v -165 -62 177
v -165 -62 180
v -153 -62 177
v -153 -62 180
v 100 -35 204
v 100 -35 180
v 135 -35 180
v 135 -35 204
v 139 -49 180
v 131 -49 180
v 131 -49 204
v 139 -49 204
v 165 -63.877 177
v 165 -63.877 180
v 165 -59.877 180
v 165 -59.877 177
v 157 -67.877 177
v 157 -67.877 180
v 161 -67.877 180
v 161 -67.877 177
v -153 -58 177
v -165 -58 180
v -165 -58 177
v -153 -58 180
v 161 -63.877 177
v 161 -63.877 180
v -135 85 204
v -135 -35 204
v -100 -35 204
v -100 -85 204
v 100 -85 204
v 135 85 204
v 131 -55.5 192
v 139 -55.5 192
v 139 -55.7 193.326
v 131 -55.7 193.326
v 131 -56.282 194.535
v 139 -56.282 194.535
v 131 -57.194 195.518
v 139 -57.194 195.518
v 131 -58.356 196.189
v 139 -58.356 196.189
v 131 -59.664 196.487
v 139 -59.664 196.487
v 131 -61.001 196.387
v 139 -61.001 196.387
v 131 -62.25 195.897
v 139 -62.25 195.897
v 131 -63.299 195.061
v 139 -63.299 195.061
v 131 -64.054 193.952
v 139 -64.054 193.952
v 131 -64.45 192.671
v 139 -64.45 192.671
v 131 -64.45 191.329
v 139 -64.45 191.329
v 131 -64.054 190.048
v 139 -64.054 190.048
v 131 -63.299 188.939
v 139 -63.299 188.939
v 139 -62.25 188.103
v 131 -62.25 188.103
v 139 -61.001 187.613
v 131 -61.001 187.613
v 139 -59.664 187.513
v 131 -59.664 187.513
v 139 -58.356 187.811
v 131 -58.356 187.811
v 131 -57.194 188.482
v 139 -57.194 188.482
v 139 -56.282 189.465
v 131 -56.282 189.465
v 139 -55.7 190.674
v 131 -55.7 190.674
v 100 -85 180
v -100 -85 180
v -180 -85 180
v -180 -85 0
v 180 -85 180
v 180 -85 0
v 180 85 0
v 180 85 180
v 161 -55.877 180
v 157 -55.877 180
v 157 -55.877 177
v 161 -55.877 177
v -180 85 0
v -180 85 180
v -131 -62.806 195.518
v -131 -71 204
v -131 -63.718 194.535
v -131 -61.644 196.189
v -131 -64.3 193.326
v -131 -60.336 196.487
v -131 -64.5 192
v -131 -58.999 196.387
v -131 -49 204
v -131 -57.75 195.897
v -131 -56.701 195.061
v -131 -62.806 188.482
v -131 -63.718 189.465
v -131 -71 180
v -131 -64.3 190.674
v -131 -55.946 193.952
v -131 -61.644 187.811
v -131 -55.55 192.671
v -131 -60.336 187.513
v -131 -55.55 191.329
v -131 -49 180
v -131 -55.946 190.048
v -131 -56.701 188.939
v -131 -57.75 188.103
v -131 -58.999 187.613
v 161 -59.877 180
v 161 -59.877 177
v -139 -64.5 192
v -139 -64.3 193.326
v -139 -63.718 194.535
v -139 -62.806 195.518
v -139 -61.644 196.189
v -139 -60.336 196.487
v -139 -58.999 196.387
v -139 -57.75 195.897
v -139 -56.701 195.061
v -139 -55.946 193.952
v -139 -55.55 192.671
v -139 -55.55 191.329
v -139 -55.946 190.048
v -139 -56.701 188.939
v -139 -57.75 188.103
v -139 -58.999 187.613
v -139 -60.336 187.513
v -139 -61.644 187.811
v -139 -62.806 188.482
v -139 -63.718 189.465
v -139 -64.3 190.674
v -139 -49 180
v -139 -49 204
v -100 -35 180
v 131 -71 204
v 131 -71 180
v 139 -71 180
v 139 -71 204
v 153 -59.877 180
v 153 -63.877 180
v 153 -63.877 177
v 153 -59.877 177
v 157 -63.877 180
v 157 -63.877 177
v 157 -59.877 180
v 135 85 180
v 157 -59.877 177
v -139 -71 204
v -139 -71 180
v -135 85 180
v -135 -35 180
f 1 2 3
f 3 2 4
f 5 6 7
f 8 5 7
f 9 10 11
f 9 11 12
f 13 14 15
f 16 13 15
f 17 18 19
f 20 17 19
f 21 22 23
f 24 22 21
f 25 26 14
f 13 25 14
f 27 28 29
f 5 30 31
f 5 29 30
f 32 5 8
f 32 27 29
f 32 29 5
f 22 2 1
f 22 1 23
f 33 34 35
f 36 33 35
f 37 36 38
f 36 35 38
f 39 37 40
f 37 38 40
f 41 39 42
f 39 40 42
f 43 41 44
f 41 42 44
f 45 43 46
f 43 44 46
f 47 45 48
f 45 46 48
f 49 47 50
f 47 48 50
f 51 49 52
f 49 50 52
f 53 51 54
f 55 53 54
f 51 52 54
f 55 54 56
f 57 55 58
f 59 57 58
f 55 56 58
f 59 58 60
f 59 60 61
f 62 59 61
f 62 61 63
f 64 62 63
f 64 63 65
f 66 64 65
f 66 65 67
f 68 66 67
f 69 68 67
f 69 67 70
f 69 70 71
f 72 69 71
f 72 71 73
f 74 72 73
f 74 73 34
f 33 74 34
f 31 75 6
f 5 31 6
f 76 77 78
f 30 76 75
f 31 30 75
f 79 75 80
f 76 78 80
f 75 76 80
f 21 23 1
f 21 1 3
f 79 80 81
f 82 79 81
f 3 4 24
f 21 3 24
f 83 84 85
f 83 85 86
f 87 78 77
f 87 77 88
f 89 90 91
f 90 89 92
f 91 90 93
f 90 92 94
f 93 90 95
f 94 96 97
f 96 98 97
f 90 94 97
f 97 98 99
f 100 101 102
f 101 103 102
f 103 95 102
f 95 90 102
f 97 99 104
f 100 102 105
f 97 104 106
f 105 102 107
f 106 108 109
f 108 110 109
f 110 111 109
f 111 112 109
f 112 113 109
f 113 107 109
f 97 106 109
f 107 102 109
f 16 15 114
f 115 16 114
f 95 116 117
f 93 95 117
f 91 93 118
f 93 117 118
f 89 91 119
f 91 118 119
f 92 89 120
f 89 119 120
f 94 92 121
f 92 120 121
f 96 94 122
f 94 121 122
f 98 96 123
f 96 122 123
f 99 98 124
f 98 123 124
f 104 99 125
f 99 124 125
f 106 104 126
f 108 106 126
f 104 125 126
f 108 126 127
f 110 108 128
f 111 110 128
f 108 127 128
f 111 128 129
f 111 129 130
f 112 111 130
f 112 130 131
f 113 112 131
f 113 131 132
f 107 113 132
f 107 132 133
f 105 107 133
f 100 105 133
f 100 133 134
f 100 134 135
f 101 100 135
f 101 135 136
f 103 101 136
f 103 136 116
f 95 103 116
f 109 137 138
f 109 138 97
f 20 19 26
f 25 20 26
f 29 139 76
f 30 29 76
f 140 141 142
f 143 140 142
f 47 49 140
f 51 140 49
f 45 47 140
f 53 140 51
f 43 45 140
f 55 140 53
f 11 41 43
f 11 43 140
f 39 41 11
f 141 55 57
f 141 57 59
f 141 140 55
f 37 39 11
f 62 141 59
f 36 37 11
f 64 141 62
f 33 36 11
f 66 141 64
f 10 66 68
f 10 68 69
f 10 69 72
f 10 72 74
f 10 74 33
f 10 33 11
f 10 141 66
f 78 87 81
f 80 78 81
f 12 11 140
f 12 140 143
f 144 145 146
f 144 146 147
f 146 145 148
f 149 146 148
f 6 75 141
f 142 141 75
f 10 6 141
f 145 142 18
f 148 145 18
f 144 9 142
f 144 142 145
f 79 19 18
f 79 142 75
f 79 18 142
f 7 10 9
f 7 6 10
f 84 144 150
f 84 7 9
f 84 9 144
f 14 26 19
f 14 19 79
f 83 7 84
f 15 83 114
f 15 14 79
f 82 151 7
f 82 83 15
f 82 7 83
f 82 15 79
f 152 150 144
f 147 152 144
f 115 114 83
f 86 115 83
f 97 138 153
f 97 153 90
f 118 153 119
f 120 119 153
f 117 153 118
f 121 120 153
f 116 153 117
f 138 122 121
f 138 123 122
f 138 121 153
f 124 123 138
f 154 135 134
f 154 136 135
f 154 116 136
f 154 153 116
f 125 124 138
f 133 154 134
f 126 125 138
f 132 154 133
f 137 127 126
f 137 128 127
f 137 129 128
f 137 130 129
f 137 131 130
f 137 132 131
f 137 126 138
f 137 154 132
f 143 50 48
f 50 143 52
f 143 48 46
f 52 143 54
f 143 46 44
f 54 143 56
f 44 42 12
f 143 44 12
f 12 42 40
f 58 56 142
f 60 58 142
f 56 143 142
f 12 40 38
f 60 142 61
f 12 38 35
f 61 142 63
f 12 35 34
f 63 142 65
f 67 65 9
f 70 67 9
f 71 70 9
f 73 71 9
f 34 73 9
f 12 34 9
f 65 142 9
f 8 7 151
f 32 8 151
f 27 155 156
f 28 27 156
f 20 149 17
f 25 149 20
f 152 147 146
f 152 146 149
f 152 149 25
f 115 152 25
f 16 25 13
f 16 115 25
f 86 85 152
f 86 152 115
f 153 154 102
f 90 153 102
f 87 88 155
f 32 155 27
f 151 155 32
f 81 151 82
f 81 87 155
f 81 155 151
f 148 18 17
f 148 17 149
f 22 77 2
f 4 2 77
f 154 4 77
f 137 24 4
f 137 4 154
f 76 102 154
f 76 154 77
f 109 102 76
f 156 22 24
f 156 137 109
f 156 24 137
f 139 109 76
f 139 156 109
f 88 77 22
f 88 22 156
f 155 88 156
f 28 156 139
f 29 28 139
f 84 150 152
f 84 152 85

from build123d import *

# Parameters (mm, degrees)
F0_W      = 360
F0_H      = 170
F1_DEPTH  = 180
F2_W      = 8
F2_H      = 22
F3_DEPTH  = 24
F4_R      = 4.5
F5_DEPTH  = 25
F6_R      = 4.5
F7_DEPTH  = 25
F8_W      = 12
F8_H      = 4
F9_W      = 4
F9_H      = 4
F10_DEPTH = 3


with BuildPart() as f1:
    # F0 (on Top) → F1 (new body)
    with BuildSketch(Plane.XY):
        Rectangle(F0_W, F0_H)
    extrude(amount=F1_DEPTH)

    # F2 (on face) → F3 (join)
    with BuildSketch(Plane.XY.offset(180)):
        Polygon((-100, -85), (0, -85), (100, -85), (100, -35), (135, -35), (135, 85), (0, 85), (-135, 85), (-135, -35), (-100, -35), align=None)
        with Locations((-135, -60)):
            Rectangle(F2_W, F2_H)
        with Locations((135, -60)):
            Rectangle(F2_W, F2_H)
    extrude(amount=F3_DEPTH)

    # F4 (on face) → F5 (cut)
    with BuildSketch(Plane(origin=(-139, 0, 0), x_dir=(0, -1, 0), z_dir=(-1, 0, 0))):
        with Locations((60, 192)):
            Circle(F4_R)
    extrude(amount=-F5_DEPTH, mode=Mode.SUBTRACT)

    # F6 (on face) → F7 (cut)
    with BuildSketch(Plane.YZ.offset(139)):
        with Locations((-60, 192)):
            Circle(F6_R)
    extrude(amount=-F7_DEPTH, mode=Mode.SUBTRACT)

    # F8 (on face) + F9 (on face) → F10 (cut)
    with BuildSketch(Plane.XY.offset(180)):
        with Locations((-159, -60)):
            Rectangle(F8_W, F8_H)
    with BuildSketch(Plane.XY.offset(180)):
        with Locations((155, -61.877079308)):
            Rectangle(F9_W, F9_H)
        with Locations((159, -61.877079308)):
            Rectangle(F9_W, F9_H)
        with Locations((163, -61.877079308)):
            Rectangle(F9_W, F9_H)
        with Locations((159, -57.877079308)):
            Rectangle(F9_W, F9_H)
        with Locations((159, -65.877079308)):
            Rectangle(F9_W, F9_H)
    extrude(amount=-F10_DEPTH, mode=Mode.SUBTRACT)


solid = f1.part
